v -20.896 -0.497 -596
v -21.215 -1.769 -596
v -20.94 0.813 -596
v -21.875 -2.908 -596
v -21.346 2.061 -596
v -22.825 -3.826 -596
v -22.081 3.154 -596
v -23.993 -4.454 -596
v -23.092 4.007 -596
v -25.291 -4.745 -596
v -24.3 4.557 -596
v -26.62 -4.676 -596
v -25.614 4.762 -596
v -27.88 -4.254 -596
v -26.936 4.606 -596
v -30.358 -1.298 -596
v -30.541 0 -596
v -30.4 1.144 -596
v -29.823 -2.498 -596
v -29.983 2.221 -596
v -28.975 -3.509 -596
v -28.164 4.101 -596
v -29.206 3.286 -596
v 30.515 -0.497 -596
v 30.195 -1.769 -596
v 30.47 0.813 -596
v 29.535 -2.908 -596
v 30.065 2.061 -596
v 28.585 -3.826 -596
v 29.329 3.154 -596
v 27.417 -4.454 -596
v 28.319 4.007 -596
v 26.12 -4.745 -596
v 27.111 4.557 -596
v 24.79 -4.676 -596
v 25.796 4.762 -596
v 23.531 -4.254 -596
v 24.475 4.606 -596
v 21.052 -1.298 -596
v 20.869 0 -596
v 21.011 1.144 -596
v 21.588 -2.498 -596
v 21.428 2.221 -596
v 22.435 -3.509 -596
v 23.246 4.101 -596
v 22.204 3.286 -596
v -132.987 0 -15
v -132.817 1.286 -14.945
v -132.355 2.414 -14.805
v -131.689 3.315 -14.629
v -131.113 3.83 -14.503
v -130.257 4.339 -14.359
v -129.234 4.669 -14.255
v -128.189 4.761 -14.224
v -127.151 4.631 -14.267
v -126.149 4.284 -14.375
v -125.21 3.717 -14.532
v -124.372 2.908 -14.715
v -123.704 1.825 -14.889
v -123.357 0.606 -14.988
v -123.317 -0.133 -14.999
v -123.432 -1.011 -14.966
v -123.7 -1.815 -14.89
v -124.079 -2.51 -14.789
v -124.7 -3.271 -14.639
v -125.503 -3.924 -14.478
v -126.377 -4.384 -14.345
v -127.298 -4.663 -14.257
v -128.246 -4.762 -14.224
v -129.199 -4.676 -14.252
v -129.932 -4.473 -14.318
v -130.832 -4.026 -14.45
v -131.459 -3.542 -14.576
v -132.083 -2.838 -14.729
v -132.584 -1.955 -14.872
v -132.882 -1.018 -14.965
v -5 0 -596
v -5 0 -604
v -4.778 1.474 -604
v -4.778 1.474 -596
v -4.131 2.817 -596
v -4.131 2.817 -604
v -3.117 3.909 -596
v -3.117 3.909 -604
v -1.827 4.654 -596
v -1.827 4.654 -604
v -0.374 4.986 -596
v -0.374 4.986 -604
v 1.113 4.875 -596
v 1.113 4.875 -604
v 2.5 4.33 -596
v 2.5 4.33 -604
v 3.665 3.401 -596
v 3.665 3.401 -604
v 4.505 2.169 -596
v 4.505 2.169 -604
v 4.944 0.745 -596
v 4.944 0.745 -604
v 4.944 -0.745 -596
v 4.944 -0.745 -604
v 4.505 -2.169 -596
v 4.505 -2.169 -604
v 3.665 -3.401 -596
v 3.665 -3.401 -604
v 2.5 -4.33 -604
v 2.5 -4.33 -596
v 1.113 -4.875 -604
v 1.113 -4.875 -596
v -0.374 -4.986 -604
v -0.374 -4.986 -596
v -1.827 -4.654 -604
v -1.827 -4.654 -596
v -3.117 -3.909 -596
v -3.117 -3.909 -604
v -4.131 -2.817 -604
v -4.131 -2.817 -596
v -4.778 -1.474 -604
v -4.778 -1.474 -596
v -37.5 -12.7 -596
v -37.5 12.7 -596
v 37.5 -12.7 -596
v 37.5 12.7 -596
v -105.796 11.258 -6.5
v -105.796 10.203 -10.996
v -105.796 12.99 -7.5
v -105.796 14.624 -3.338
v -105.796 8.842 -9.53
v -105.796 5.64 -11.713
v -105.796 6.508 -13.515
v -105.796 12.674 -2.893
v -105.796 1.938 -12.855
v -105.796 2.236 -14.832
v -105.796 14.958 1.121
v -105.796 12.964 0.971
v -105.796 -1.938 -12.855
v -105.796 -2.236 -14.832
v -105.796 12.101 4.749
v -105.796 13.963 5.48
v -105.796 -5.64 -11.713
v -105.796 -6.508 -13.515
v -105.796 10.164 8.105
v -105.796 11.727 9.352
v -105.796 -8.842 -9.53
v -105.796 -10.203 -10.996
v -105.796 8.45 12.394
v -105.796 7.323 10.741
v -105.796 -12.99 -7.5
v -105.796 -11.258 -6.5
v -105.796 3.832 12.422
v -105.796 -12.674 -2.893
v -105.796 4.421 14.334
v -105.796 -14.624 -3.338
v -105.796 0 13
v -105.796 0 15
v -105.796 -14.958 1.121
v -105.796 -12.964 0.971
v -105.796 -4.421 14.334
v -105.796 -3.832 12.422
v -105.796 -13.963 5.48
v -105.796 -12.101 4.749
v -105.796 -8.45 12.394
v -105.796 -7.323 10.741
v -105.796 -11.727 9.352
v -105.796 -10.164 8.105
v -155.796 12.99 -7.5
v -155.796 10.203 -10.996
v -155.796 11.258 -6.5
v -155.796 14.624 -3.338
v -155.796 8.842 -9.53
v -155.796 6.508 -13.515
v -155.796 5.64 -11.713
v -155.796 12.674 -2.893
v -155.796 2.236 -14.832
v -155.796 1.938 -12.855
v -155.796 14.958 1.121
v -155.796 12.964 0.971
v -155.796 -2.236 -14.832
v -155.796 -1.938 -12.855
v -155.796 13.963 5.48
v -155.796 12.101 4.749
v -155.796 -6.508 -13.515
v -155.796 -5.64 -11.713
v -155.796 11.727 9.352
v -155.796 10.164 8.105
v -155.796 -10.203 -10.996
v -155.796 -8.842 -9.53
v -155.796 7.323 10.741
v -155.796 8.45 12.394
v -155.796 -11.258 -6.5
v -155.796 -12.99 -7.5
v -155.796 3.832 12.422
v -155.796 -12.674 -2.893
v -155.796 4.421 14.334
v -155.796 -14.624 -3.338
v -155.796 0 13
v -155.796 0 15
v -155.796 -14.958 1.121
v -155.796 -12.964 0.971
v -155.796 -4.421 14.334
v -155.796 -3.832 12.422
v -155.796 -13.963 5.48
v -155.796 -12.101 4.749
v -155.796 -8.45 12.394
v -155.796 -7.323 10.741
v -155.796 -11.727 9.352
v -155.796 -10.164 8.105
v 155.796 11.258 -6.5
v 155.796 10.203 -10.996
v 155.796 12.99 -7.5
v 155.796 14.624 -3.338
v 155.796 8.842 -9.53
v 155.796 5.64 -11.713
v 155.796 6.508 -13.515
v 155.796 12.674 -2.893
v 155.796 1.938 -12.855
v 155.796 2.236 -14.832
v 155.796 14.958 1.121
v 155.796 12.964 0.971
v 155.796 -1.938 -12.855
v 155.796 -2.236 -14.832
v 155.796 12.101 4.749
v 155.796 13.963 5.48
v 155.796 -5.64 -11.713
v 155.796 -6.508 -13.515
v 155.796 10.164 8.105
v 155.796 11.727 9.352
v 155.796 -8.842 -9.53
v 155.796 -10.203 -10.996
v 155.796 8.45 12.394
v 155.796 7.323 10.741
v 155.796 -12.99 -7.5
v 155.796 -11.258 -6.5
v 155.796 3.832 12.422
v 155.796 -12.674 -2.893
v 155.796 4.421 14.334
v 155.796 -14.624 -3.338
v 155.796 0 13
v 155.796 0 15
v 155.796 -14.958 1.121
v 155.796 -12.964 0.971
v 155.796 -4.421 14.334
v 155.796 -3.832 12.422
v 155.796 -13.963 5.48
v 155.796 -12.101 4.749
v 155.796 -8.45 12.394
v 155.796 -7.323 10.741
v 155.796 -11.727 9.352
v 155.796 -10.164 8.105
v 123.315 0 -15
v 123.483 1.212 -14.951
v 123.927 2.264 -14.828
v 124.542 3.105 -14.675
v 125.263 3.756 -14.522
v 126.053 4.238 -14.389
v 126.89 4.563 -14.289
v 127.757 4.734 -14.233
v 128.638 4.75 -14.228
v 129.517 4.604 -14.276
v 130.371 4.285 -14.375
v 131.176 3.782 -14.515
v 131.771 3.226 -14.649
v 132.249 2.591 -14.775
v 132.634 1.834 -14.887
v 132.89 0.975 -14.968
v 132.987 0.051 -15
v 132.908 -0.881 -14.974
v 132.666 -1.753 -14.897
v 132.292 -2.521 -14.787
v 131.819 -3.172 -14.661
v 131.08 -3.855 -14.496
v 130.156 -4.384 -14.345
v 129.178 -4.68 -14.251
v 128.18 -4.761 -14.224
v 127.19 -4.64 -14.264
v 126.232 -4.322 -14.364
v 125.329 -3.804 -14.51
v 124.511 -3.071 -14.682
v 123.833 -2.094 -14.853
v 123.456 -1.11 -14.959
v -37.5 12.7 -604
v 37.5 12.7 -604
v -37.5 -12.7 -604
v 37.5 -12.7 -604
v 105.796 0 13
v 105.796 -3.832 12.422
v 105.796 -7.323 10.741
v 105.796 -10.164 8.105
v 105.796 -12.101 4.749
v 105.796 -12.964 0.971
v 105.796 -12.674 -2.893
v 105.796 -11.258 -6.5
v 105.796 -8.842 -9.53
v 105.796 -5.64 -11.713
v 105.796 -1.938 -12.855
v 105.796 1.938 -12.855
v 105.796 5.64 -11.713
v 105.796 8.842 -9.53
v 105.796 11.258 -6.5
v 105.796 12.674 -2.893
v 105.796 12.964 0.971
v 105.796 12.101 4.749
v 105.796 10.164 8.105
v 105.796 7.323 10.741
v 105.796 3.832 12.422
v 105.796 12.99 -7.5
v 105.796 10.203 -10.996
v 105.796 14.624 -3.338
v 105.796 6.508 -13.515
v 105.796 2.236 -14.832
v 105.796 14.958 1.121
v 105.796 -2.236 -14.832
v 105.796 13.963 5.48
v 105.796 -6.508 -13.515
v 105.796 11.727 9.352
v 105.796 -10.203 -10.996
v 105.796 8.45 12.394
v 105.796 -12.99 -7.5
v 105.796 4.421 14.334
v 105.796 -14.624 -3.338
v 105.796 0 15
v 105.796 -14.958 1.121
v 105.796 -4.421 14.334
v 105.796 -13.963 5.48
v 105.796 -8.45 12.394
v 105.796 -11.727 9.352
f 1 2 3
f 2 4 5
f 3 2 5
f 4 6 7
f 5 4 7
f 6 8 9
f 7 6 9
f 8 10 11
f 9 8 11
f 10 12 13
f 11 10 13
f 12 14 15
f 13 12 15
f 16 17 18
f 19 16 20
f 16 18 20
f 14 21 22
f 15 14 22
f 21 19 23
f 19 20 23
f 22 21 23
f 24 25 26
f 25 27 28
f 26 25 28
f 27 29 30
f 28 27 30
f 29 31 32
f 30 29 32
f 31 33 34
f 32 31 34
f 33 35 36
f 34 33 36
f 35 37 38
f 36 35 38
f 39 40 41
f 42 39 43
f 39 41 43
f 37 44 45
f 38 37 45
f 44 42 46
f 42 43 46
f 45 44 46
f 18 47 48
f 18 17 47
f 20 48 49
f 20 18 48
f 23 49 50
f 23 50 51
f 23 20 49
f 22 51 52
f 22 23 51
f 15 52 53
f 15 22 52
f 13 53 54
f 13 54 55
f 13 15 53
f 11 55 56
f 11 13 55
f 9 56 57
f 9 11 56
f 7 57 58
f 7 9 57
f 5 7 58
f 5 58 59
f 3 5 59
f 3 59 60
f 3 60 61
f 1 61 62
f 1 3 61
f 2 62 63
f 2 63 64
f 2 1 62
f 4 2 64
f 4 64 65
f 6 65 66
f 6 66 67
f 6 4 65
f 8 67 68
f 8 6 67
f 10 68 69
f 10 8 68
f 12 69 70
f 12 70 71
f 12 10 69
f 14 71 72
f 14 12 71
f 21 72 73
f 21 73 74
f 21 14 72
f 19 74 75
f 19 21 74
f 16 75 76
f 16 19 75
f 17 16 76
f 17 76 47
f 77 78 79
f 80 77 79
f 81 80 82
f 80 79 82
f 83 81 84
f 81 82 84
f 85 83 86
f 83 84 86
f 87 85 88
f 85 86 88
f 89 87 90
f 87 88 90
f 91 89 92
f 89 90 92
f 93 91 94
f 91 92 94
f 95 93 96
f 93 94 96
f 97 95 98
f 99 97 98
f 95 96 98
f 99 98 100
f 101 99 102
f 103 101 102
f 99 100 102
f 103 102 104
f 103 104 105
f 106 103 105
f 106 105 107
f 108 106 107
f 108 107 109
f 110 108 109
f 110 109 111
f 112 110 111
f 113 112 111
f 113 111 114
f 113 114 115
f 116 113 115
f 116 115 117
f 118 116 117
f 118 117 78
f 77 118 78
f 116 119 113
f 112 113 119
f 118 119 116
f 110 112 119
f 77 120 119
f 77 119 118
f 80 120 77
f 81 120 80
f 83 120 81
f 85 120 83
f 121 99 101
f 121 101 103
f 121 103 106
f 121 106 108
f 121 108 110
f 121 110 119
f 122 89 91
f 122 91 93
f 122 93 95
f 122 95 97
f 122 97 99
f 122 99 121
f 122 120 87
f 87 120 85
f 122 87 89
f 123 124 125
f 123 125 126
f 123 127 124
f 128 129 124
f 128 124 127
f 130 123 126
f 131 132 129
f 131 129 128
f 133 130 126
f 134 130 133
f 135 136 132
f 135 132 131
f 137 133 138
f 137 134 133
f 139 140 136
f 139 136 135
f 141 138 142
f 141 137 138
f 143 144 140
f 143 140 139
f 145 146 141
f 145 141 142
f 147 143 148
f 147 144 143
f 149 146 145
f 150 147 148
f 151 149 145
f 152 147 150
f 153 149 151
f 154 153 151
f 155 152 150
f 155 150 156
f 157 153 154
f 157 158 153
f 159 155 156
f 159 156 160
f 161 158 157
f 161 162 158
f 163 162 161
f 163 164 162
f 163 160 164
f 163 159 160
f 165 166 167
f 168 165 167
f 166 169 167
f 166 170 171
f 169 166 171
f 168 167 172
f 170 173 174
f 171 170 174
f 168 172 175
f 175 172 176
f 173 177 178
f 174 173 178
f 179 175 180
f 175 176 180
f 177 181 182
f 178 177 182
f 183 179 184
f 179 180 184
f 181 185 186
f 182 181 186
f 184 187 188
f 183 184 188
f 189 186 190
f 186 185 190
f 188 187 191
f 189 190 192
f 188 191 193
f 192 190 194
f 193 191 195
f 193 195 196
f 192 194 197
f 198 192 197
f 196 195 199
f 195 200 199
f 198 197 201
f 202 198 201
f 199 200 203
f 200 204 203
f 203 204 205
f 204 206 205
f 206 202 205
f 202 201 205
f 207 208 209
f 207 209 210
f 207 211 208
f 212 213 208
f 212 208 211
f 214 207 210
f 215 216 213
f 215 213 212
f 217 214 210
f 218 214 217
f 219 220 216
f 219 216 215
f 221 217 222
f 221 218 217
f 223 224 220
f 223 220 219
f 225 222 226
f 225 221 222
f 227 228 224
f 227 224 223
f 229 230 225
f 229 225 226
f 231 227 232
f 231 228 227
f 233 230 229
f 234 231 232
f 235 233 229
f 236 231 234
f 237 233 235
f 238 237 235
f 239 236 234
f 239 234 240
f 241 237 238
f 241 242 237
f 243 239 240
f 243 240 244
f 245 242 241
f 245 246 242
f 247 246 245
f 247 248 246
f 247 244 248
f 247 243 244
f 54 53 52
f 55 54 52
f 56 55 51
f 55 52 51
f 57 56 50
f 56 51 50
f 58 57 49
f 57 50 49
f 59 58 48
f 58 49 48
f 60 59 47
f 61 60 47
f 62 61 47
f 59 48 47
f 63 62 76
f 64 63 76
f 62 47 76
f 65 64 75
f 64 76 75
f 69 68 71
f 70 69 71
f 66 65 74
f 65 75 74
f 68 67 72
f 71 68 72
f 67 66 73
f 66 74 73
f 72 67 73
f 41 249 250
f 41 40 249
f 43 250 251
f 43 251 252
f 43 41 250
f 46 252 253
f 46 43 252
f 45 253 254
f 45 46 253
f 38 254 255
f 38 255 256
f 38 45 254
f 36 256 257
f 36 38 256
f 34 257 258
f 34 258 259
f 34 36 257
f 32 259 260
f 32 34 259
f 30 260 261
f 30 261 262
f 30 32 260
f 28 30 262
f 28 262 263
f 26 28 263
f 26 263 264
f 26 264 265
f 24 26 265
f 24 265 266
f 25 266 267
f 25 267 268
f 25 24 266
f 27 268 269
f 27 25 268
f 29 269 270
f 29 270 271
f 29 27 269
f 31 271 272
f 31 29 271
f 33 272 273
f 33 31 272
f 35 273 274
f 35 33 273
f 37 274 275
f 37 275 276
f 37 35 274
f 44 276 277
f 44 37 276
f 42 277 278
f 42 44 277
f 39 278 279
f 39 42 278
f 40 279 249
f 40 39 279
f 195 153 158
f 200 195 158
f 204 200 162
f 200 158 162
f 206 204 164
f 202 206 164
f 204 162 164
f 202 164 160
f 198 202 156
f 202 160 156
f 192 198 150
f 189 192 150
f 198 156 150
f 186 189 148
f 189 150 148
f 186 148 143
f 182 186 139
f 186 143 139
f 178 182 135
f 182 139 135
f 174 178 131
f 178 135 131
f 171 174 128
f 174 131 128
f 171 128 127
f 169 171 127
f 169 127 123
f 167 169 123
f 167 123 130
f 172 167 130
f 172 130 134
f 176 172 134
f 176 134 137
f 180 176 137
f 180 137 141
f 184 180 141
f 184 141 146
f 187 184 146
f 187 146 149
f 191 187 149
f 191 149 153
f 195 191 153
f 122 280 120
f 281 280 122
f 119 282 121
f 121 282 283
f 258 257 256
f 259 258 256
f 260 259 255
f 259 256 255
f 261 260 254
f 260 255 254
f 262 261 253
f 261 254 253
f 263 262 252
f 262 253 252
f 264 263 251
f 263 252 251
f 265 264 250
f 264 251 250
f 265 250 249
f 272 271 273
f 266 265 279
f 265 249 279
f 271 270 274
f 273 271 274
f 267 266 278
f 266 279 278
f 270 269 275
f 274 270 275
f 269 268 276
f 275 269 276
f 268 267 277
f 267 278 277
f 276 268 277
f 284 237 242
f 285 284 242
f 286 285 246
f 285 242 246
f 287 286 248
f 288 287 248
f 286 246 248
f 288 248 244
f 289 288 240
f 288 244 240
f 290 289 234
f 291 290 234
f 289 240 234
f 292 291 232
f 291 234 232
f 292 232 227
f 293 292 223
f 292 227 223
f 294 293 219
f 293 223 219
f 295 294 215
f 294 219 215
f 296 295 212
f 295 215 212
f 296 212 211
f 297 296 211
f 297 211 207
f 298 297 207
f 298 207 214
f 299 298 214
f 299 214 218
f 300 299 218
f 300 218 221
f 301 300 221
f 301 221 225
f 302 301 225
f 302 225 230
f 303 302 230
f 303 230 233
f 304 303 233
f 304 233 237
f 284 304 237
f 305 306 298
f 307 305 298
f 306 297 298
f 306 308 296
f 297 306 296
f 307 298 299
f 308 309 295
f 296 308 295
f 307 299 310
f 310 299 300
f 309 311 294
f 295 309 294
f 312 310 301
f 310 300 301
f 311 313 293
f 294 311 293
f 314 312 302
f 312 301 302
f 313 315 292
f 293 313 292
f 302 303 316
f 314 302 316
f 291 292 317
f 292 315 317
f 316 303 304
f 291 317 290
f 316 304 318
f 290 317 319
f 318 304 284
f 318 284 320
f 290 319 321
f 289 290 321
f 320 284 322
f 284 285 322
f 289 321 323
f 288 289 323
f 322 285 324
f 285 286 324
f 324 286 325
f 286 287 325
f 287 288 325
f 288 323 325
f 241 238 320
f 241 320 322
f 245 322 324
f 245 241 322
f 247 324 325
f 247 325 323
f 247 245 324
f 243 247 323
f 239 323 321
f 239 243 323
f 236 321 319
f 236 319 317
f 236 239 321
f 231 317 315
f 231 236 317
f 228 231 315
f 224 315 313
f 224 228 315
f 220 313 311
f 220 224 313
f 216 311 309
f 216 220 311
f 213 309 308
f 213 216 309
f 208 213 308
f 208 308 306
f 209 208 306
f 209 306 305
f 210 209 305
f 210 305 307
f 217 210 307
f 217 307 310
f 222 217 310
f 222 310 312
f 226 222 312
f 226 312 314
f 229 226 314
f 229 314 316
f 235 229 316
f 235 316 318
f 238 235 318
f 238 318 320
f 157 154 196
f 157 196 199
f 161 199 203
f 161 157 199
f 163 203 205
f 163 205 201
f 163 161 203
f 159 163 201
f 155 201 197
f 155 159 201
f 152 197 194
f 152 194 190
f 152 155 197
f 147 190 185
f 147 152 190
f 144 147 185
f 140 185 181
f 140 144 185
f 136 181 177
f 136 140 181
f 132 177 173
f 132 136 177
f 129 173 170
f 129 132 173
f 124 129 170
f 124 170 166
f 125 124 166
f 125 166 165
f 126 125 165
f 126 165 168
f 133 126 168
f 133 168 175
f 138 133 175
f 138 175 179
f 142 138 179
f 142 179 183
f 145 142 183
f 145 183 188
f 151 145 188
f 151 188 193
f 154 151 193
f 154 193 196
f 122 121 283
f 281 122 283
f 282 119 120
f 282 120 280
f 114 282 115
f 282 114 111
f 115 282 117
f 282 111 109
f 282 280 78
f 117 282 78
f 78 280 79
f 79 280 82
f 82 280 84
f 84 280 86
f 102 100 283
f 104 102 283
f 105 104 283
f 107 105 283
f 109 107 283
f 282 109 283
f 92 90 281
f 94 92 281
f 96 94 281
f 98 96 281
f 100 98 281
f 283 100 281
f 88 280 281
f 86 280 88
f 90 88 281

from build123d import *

# Parameters (mm, degrees)
SWEEP2_PROFILE_R        = 4.7625
SWEEP3_PROFILE_R        = 4.7625
SWEEP_THIN2_PROFILE_R   = 15
SWEEP_THIN2_PROFILE_R_2 = 13
SWEEP_THIN3_PROFILE_R   = 15
SWEEP_THIN3_PROFILE_R_2 = 13
BOSS_EXTRUDE1_DEPTH     = 12.7
SKETCH164_W             = 8
SKETCH164_H             = 25.4
CUT_EXTRUDE1_DEPTH      = 635.353542167
SKETCH165_R             = 15
CUT_EXTRUDE2_DEPTH      = 680.802036854
SKETCH166_R             = 5
CUT_EXTRUDE3_DEPTH      = 25.4


with BuildPart() as part:
    # Sweep2: sweep along a path in Sketch1
    with BuildLine(Plane(origin=(0, 0, 0), x_dir=(1, 0, 0), z_dir=(0, 1, 0))) as sweep2_path:
        Line((130.796188425, 0), (25, 600))
    # Sweep2 profile (on start of the path) → Sweep2 (sweep)
    with BuildSketch(Plane(origin=(130.796188425, 0, 0), x_dir=(-0.9848077530122079, 0, 0.17364817766693125), z_dir=(-0.17364817766693125, 0, -0.9848077530122079))):
        Circle(SWEEP2_PROFILE_R)
    sweep(path=sweep2_path.line)


with BuildPart() as body_2:
    # Sweep3: sweep along a path in Sketch78
    with BuildLine(Plane(origin=(0, 0, 0), x_dir=(1, 0, 0), z_dir=(0, 1, 0))) as sweep3_path:
        Line((-130.796188425, 0), (-25, 600))
    # Sweep3 profile (on start of the path) → Sweep3 (sweep)
    with BuildSketch(Plane(origin=(-130.796188425, 0, 0), x_dir=(-0.9848077530122079, 0, -0.17364817766693125), z_dir=(0.17364817766693125, 0, -0.9848077530122079))):
        Circle(SWEEP3_PROFILE_R)
    sweep(path=sweep3_path.line)


with BuildPart() as body_3:
    # Sweep-Thin2: sweep along a path in Sketch87
    with BuildLine(Plane(origin=(0, 0, 0), x_dir=(1, 0, 0), z_dir=(0, 1, 0))) as sweep_thin2_path:
        Line((-155.796188425, 0), (-105.796188425, 0))
    # Sweep-Thin2 profile (on start of the path) → Sweep-Thin2 (sweep)
    with BuildSketch(Plane(origin=(-155.796188425, 0, 0), x_dir=(0, 0, 1), z_dir=(1, 0, 0))):
        Circle(SWEEP_THIN2_PROFILE_R)
        Circle(SWEEP_THIN2_PROFILE_R_2, mode=Mode.SUBTRACT)
    sweep(path=sweep_thin2_path.line)


with BuildPart() as body_4:
    # Sweep-Thin3: sweep along a path in Sketch140
    with BuildLine(Plane(origin=(0, 0, 0), x_dir=(1, 0, 0), z_dir=(0, 1, 0))) as sweep_thin3_path:
        Line((105.796188425, 0), (155.796188425, 0))
    # Sweep-Thin3 profile (on start of the path) → Sweep-Thin3 (sweep)
    with BuildSketch(Plane(origin=(105.796188425, 0, 0), x_dir=(0, 0, 1), z_dir=(1, 0, 0))):
        Circle(SWEEP_THIN3_PROFILE_R)
        Circle(SWEEP_THIN3_PROFILE_R_2, mode=Mode.SUBTRACT)
    sweep(path=sweep_thin3_path.line)


with BuildPart() as body_5:
    # Sketch161 → Boss-Extrude1 (new, symmetric)
    with BuildSketch(Plane(origin=(0, 0, 0), x_dir=(1, 0, 0), z_dir=(0, 1, 0))):
        Polygon((37.5, 604), (-37.5, 604), (-37.5, 596), (-25.705307923, 596), (25.705307923, 596), (37.5, 596), align=None)
    extrude(amount=BOSS_EXTRUDE1_DEPTH, both=True)

    # Sketch166 → Cut-Extrude3 (cut)
    with BuildSketch(Plane(origin=(0, 0, -604), x_dir=(-1, 0, 0), z_dir=(0, 0, -1))):
        Circle(SKETCH166_R)
    extrude(amount=-CUT_EXTRUDE3_DEPTH, mode=Mode.SUBTRACT)


with BuildPart() as cut_extrude1_tool:
    # Sketch164 → Cut-Extrude1 (new, through all)
    with BuildSketch(Plane.ZY.offset(37.5)):
        with Locations((-600, 0)):
            Rectangle(SKETCH164_W, SKETCH164_H)
    extrude(amount=-CUT_EXTRUDE1_DEPTH)


with BuildPart() as body_2_1:
    add(body_2.part)

    # Cut-Extrude1: cut by cut_extrude1_tool
    add(cut_extrude1_tool.part, mode=Mode.SUBTRACT)


with BuildPart() as part_1:
    add(part.part)

    # Cut-Extrude1: cut by cut_extrude1_tool
    add(cut_extrude1_tool.part, mode=Mode.SUBTRACT)


with BuildPart() as cut_extrude2_tool:
    # Sketch165 → Cut-Extrude2 (new, through all)
    with BuildSketch(Plane.ZY.offset(155.796188425)):
        Circle(SKETCH165_R)
    extrude(amount=-CUT_EXTRUDE2_DEPTH)


with BuildPart() as body_2_2:
    add(body_2_1.part)

    # Cut-Extrude2: cut by cut_extrude2_tool
    add(cut_extrude2_tool.part, mode=Mode.SUBTRACT)


with BuildPart() as part_2:
    add(part_1.part)

    # Cut-Extrude2: cut by cut_extrude2_tool
    add(cut_extrude2_tool.part, mode=Mode.SUBTRACT)


solid = Compound([body_3.part, body_4.part, body_5.part, body_2_2.part, part_2.part])
